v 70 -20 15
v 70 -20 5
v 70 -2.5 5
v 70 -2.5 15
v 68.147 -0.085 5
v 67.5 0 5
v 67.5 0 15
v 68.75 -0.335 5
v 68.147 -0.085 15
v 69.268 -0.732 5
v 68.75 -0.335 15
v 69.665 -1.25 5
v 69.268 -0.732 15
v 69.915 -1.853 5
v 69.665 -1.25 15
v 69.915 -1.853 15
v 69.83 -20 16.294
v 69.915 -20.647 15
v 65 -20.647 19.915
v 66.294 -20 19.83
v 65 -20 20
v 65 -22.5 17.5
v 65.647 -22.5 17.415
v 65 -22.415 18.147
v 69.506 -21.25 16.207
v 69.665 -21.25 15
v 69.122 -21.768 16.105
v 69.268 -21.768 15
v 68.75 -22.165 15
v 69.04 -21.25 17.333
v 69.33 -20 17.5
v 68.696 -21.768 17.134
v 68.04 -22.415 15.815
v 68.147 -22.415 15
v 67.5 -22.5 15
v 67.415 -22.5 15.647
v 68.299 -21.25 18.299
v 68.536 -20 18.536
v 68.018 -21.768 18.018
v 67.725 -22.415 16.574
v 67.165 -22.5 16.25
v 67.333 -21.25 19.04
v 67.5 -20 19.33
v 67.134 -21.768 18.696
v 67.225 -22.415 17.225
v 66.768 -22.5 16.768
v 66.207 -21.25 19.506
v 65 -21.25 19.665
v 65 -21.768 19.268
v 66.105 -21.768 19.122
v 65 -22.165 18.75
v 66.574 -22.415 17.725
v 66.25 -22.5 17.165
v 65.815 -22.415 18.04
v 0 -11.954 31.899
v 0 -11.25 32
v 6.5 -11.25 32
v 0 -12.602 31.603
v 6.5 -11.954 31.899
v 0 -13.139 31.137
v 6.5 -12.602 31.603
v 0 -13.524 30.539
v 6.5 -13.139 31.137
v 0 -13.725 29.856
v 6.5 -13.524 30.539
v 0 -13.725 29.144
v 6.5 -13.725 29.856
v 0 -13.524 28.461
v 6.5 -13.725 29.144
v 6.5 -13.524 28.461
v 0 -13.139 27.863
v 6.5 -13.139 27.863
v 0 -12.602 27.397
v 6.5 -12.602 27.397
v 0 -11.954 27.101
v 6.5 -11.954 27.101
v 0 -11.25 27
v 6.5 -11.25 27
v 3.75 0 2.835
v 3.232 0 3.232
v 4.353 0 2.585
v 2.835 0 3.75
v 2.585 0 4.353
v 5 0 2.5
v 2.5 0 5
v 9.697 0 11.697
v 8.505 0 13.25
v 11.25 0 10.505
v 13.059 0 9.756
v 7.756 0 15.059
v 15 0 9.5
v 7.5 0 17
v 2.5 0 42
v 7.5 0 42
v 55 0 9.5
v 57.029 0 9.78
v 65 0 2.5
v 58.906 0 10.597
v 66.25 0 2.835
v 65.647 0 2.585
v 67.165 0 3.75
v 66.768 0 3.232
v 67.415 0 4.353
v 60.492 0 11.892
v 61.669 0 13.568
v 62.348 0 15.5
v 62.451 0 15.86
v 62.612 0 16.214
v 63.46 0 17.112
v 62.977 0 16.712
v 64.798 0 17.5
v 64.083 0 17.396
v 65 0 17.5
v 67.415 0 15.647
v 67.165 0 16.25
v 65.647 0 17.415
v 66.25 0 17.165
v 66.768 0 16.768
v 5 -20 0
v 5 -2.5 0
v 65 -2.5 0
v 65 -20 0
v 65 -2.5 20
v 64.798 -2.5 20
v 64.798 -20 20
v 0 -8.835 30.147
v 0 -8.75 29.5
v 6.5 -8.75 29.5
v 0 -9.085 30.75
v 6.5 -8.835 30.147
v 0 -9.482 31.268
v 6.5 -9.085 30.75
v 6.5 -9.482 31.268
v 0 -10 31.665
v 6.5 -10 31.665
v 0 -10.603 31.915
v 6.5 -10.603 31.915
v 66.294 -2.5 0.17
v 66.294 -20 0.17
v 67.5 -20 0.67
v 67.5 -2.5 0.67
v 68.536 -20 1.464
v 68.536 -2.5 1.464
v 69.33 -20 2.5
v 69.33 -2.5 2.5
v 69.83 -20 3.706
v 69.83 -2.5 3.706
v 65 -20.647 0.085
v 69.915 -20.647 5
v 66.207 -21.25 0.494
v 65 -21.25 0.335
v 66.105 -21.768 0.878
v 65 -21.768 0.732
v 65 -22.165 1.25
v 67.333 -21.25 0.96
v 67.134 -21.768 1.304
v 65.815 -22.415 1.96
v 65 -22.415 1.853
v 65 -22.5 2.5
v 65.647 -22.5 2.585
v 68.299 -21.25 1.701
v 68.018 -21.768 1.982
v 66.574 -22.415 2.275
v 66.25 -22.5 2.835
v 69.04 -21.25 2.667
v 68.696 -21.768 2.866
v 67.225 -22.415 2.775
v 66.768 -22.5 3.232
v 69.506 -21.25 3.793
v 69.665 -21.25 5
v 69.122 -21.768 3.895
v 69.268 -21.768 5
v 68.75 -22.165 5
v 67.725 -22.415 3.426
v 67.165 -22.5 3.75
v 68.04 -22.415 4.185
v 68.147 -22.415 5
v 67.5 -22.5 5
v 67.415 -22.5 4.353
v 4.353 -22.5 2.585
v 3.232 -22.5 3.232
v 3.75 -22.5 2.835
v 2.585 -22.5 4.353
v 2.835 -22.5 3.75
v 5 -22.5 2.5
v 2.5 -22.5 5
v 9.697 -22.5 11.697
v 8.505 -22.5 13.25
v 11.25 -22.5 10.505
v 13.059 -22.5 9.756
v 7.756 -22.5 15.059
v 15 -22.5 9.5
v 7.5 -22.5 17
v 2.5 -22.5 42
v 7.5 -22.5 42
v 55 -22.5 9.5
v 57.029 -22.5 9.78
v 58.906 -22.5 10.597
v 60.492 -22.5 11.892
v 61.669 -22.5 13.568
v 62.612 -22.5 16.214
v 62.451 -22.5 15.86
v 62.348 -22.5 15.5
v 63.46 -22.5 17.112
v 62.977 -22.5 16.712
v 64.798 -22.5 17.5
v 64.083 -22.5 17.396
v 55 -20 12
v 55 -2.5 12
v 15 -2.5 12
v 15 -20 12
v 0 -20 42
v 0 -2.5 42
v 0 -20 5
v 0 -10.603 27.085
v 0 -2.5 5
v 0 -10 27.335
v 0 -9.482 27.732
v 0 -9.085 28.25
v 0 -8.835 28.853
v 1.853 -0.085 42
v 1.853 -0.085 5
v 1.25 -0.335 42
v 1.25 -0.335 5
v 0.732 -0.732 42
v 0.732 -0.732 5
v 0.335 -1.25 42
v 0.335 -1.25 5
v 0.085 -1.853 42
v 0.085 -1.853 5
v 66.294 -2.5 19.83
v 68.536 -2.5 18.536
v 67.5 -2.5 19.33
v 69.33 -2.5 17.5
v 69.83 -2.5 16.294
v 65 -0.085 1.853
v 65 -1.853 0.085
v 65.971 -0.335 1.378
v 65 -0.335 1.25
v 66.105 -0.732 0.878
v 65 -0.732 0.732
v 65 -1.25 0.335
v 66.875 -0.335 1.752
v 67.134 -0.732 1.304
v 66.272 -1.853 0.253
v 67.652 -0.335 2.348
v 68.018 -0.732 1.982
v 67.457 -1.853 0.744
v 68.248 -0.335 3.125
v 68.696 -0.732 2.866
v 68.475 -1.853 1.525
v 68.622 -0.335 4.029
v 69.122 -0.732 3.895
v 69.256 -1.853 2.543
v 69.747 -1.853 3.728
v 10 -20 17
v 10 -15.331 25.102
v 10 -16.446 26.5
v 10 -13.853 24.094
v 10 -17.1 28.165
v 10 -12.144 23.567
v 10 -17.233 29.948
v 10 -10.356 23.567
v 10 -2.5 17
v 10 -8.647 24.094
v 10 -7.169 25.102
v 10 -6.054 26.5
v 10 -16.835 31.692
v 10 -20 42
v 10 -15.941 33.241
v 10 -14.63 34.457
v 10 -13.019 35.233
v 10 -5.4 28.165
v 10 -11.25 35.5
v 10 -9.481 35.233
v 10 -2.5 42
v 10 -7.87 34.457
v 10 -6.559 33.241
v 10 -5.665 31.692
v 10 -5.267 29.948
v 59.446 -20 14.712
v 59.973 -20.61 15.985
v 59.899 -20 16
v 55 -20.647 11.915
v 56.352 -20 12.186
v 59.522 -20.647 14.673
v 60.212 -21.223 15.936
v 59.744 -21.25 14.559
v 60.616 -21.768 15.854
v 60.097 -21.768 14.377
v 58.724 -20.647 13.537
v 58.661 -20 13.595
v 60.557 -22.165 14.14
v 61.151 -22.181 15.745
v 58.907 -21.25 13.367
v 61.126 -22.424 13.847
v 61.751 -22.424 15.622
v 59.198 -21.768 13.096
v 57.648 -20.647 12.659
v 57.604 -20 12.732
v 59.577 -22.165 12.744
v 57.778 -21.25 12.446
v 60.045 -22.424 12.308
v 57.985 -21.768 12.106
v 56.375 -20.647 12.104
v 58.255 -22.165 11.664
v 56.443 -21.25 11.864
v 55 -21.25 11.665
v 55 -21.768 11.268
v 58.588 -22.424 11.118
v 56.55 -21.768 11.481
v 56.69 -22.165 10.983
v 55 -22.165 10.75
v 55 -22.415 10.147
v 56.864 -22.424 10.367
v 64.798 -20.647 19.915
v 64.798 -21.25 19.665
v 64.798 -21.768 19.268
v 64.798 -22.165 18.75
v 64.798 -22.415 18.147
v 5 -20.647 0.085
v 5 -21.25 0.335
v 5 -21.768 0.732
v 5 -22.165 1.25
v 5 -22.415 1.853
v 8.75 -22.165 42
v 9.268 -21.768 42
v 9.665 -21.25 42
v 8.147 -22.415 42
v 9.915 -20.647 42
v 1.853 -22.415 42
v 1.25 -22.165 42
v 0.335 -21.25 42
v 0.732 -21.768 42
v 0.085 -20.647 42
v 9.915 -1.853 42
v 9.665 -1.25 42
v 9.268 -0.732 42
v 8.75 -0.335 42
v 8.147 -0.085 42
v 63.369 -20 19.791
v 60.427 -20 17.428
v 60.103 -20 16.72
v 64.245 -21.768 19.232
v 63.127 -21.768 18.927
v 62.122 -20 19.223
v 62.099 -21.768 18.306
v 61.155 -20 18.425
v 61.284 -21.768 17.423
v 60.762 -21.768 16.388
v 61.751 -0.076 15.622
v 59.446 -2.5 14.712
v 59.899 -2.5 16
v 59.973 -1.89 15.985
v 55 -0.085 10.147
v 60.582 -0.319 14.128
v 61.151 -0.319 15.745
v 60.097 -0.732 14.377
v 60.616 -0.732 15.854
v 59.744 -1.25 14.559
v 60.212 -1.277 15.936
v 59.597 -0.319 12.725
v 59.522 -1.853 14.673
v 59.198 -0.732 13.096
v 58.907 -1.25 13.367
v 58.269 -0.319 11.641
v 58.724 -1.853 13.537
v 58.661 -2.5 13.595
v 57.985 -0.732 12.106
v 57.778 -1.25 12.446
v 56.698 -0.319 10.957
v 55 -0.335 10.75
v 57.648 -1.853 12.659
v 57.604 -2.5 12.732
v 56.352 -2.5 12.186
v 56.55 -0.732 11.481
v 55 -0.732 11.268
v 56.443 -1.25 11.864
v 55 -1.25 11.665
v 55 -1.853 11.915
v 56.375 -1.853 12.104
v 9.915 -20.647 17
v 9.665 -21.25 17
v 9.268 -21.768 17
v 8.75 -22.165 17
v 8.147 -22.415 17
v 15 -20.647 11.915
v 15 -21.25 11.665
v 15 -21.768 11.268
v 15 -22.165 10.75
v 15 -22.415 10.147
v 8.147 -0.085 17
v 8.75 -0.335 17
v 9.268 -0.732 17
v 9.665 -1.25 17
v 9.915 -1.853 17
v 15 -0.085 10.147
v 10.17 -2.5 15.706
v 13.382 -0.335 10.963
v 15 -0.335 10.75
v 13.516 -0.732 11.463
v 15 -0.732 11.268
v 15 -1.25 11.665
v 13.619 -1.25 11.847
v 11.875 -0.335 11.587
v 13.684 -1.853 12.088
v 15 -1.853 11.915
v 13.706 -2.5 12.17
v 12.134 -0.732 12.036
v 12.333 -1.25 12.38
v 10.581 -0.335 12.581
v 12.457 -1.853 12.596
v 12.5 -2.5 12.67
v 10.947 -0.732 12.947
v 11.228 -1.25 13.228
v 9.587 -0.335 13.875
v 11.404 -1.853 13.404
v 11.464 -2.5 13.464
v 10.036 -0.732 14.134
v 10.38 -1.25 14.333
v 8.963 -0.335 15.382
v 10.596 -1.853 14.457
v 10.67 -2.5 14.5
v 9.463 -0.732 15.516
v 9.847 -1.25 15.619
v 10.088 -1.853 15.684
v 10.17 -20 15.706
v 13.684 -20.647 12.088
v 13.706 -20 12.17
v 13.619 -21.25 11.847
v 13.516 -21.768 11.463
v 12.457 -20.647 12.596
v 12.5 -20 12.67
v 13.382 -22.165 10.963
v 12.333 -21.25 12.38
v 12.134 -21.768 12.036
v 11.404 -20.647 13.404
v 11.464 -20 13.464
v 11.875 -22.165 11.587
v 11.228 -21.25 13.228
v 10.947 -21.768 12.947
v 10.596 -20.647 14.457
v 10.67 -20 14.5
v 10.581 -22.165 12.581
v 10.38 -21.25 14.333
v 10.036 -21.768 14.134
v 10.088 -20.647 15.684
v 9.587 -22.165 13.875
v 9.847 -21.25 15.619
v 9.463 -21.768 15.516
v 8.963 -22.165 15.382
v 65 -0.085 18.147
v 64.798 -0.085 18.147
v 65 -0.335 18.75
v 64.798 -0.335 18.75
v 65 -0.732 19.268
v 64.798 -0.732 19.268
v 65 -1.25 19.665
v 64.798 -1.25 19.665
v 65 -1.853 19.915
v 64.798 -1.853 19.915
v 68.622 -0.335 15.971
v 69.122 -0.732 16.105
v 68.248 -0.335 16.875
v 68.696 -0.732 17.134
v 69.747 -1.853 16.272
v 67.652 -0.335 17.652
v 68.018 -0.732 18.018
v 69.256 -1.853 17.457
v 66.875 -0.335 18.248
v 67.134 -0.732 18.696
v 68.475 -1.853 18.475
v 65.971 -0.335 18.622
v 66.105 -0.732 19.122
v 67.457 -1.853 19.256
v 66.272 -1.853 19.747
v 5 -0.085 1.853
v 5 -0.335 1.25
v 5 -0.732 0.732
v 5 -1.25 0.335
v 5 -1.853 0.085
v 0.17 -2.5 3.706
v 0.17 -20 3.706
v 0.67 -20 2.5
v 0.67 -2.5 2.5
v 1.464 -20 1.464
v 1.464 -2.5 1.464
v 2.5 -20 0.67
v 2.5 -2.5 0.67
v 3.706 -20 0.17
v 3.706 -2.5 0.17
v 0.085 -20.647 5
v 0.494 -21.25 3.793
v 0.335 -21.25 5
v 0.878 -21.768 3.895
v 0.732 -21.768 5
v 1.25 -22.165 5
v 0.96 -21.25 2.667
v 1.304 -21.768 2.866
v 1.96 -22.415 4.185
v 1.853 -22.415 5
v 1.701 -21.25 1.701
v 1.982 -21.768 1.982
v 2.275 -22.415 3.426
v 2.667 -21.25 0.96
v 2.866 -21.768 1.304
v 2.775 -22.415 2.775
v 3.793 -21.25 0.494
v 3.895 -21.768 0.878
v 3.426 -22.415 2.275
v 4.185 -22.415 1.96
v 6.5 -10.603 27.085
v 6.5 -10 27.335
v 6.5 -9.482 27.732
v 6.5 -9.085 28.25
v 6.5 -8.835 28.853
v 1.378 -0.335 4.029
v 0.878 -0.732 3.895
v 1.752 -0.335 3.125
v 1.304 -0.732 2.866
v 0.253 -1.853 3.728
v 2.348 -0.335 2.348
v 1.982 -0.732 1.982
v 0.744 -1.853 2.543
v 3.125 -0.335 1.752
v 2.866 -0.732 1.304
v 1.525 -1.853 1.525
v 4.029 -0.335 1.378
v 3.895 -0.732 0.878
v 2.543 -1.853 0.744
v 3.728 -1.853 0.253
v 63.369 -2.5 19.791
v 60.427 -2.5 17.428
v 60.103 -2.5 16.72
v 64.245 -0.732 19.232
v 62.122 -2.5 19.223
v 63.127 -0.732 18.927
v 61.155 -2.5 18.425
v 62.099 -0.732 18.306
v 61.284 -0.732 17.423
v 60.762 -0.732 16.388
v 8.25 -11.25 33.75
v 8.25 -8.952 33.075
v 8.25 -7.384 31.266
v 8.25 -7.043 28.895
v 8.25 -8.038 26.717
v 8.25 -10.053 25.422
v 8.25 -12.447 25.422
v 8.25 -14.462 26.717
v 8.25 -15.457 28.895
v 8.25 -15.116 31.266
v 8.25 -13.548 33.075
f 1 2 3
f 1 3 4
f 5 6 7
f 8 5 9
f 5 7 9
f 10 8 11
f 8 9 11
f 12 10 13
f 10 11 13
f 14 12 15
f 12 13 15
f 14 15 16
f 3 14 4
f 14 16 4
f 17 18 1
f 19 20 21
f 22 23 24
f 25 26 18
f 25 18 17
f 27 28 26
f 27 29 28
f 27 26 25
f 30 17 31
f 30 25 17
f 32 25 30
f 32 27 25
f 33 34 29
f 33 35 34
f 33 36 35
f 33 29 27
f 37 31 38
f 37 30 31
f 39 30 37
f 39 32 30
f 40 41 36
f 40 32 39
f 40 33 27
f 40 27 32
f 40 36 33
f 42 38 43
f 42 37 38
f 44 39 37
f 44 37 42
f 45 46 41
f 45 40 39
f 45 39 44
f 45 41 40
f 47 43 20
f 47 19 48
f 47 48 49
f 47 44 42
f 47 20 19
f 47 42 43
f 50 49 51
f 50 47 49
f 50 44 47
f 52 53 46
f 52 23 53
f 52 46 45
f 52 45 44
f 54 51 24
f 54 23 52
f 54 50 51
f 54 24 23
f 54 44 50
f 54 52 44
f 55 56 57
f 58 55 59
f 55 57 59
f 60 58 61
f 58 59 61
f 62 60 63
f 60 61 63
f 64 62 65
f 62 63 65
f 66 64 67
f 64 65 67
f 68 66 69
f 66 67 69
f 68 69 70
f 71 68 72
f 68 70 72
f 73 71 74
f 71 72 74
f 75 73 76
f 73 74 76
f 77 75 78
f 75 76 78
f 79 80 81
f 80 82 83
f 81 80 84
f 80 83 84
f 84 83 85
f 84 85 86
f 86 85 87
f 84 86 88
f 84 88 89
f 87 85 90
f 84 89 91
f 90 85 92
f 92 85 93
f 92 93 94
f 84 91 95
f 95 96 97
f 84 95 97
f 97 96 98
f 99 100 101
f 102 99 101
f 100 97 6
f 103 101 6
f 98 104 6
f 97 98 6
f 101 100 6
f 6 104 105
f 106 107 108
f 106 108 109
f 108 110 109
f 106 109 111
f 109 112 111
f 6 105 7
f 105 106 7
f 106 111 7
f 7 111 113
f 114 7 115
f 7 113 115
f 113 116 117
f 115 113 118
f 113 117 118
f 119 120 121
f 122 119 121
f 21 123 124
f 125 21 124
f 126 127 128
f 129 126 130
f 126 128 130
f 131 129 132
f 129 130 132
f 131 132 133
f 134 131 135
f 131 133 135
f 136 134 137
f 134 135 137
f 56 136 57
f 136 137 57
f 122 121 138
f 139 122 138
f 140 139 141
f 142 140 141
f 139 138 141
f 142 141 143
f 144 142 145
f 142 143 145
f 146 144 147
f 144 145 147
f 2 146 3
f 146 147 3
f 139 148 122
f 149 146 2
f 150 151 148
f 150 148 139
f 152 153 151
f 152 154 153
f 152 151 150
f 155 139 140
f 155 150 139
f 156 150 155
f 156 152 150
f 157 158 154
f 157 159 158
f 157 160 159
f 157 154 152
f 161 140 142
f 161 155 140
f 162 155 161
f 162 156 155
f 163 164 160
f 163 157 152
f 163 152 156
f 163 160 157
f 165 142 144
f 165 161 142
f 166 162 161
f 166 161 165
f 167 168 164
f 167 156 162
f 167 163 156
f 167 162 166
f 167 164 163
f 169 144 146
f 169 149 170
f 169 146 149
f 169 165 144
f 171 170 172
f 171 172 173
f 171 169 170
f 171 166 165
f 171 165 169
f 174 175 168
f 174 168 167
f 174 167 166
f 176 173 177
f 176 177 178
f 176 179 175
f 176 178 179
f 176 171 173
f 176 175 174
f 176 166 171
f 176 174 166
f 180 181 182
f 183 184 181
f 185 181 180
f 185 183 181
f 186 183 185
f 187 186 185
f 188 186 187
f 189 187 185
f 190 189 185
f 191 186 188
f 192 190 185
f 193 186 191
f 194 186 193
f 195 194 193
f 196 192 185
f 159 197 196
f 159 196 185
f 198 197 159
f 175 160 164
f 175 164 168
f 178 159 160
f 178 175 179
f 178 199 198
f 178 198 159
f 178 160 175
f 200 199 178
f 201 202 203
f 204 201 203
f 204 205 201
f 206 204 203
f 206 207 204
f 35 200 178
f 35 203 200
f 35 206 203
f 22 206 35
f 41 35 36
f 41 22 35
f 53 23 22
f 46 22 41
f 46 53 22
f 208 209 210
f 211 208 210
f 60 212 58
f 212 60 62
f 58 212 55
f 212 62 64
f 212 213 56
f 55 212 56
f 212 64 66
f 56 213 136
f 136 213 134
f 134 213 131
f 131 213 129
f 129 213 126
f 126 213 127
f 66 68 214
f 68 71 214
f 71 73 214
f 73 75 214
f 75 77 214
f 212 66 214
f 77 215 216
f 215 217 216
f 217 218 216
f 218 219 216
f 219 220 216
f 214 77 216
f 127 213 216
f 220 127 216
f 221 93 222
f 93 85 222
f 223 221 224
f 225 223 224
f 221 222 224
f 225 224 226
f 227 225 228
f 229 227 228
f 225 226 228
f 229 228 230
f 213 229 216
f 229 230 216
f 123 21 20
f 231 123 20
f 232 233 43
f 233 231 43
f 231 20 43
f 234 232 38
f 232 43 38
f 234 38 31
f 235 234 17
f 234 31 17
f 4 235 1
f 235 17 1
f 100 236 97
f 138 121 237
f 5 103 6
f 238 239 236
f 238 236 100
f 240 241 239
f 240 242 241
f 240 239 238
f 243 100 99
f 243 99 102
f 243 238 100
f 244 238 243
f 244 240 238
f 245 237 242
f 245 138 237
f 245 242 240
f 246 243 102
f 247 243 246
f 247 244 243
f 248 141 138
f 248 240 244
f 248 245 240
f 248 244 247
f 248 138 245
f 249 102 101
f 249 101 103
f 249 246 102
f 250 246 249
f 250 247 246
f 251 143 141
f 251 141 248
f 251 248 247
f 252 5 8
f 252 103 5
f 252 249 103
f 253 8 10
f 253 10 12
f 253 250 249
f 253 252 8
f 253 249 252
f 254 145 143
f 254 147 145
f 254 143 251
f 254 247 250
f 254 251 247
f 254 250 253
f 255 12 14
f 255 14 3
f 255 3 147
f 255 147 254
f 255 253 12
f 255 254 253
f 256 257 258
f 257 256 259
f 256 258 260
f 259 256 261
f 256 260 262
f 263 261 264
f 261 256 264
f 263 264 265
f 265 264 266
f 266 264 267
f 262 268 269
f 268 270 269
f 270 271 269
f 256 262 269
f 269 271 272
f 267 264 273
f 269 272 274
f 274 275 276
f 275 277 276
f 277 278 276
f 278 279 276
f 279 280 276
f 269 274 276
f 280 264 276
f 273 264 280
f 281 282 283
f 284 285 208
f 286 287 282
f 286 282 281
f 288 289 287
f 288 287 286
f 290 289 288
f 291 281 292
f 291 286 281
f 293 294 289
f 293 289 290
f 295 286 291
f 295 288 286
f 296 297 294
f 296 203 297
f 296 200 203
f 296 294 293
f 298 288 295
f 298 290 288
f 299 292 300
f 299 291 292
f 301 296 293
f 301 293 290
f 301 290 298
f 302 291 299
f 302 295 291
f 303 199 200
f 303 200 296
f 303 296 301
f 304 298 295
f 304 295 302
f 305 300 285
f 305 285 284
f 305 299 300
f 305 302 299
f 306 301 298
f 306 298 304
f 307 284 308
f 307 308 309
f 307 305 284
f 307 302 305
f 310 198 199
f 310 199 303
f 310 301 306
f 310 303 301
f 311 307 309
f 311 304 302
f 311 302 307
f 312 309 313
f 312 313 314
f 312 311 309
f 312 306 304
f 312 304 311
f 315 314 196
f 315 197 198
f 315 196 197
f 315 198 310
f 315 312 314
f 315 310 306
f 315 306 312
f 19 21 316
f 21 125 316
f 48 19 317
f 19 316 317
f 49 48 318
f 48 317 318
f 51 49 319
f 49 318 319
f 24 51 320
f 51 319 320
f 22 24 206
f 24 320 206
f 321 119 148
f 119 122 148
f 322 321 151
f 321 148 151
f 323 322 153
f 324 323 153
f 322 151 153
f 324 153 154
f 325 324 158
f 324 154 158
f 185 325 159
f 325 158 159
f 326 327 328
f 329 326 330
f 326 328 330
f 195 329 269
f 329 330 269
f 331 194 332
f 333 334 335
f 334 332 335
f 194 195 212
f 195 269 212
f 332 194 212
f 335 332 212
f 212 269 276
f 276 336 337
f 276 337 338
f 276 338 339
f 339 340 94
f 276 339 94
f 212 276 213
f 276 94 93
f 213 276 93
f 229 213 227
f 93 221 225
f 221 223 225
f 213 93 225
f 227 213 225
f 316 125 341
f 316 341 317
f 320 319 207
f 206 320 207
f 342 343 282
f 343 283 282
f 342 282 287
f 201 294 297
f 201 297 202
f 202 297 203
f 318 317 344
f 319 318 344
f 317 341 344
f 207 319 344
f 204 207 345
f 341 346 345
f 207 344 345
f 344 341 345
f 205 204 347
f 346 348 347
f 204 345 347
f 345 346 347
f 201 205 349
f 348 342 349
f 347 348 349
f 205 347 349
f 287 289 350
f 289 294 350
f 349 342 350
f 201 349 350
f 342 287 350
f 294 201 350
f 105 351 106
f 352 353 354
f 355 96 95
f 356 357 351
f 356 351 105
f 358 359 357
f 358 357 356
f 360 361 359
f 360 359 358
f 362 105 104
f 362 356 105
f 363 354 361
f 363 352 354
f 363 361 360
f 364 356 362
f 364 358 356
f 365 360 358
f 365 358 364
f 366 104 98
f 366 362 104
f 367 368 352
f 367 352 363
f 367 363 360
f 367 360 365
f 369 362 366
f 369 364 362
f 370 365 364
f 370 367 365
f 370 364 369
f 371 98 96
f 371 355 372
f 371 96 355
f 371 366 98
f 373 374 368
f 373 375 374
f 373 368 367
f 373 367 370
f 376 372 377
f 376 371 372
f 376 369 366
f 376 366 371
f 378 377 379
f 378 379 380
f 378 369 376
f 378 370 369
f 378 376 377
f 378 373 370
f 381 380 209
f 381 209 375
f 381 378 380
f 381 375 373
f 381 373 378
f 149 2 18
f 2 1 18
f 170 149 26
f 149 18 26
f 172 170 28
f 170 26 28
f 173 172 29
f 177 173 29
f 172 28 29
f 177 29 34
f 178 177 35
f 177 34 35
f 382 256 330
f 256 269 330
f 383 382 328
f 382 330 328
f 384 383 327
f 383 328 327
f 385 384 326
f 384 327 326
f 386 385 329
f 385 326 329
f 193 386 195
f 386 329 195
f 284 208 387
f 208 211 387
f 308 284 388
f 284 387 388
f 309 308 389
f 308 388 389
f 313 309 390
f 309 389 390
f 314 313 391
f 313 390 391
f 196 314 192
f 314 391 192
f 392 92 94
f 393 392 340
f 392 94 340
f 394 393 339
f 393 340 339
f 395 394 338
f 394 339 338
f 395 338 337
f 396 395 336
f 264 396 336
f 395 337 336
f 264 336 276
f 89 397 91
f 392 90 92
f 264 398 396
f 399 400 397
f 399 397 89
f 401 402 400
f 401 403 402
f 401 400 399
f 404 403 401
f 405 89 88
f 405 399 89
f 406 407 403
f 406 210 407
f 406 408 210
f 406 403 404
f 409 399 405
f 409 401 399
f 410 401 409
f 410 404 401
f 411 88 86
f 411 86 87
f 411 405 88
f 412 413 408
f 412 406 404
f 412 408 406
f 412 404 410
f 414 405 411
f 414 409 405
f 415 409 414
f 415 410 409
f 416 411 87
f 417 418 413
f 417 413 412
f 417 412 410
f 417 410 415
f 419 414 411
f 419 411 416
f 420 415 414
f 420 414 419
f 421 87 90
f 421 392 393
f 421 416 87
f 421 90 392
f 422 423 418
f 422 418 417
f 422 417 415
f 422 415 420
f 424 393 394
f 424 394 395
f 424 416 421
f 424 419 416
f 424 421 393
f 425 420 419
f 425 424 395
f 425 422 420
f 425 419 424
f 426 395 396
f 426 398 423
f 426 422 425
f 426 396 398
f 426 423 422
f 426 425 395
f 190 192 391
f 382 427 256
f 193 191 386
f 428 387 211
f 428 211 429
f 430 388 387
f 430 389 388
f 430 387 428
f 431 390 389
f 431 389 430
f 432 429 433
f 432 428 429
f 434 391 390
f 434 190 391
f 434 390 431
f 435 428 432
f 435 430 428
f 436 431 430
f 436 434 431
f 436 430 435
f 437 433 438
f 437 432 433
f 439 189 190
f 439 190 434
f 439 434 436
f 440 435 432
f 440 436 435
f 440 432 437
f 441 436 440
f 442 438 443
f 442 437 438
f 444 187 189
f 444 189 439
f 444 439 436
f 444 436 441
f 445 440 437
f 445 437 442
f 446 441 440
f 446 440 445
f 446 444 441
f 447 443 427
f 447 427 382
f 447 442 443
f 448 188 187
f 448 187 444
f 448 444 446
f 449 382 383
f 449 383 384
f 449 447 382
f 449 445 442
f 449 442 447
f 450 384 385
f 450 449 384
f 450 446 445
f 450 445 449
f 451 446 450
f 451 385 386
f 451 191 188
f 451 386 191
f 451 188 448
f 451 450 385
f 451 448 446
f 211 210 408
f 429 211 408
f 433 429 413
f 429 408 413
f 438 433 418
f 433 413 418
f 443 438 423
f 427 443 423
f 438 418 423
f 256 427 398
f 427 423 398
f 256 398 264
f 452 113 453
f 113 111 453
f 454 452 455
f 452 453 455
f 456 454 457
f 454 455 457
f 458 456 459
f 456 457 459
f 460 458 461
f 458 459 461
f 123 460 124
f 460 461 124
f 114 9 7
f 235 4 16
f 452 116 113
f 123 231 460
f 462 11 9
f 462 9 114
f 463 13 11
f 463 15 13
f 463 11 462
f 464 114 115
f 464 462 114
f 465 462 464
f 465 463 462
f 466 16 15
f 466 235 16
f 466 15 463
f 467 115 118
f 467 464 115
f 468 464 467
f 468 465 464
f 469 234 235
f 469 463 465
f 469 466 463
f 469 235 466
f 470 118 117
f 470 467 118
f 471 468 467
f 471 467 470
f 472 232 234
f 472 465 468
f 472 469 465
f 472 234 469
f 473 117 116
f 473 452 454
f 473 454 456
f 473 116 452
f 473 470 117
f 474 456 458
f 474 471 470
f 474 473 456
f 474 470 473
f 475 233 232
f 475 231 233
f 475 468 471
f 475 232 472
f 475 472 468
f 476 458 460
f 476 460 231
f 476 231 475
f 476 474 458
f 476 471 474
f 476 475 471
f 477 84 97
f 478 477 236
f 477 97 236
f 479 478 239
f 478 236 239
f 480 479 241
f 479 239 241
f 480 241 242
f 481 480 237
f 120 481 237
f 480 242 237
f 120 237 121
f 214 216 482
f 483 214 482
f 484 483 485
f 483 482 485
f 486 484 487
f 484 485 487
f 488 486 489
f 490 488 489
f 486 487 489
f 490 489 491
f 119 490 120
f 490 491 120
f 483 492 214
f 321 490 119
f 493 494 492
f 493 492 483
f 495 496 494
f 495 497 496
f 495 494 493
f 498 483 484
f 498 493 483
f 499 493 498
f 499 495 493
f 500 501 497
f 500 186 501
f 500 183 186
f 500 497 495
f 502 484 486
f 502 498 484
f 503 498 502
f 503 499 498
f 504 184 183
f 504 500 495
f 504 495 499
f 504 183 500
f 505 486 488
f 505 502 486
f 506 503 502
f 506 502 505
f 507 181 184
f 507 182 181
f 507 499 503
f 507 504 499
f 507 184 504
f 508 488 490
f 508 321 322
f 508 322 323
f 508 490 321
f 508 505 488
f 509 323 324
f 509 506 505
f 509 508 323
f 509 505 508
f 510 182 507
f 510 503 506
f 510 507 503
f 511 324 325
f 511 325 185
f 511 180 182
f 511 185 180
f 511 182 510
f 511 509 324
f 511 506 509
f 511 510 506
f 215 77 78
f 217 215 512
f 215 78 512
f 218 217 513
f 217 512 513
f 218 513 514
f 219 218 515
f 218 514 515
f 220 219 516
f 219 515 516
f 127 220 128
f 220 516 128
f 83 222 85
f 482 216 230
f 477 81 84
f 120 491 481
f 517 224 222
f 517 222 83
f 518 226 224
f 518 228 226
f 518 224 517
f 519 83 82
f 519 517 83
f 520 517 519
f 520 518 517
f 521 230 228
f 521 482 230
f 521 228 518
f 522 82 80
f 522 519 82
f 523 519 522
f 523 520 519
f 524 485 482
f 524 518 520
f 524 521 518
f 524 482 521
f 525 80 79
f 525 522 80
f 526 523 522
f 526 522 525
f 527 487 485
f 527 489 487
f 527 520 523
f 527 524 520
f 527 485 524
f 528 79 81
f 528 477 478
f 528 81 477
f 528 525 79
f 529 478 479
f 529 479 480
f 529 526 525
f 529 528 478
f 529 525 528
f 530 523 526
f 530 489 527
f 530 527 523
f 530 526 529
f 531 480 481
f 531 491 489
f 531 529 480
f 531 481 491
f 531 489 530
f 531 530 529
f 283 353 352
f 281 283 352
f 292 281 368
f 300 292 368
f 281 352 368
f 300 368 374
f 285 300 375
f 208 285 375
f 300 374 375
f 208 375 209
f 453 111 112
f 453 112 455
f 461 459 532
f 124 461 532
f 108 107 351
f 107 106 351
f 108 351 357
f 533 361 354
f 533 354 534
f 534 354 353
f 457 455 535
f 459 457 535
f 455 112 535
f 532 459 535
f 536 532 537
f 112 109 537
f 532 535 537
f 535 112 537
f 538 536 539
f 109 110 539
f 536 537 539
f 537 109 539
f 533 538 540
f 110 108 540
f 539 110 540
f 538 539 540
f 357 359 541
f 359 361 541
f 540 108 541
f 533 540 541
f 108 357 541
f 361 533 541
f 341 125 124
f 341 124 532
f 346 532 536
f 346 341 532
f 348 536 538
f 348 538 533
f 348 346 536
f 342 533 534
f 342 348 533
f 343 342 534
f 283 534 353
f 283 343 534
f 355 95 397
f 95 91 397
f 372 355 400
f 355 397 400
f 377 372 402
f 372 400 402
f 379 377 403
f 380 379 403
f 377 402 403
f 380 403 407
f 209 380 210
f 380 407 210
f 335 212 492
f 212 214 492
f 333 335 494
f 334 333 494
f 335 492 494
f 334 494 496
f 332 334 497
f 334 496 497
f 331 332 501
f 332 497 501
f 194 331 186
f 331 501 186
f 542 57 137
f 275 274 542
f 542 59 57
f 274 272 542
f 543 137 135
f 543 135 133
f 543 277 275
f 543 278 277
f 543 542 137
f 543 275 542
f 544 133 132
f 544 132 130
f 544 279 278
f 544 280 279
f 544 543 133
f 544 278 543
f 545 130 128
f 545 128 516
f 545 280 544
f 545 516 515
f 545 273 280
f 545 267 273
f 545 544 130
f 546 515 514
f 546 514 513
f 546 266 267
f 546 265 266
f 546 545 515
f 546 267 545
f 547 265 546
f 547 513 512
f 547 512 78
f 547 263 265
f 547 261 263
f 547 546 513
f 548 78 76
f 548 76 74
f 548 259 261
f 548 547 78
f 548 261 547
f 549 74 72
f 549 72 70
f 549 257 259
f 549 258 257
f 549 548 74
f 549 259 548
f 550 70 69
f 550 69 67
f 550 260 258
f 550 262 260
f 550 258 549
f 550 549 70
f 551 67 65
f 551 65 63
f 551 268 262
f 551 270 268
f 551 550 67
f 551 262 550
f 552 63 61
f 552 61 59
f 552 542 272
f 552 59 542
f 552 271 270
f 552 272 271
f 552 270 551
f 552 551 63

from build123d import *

# Parameters (mm, degrees)
F1_DEPTH = 22.5
F3_DEPTH = 25
F7_R     = 5
F8_R     = 5
F9_R     = 2.5


with BuildPart() as f1:
    # F0 (on Front) → F1 (new body)
    with BuildSketch(Plane.XZ):
        with BuildLine():
            Line((0, 42), (0, 5))
            ThreePointArc((0, 5), (1.4644660941, 1.4644660941), (5, 0))
            Line((5, 0), (65, 0))
            ThreePointArc((65, 0), (68.5355339059, 1.4644660941), (70, 5))
            Line((70, 5), (70, 20))
            Line((70, 20), (60, 20))
            Line((60, 20), (60, 17))
            ThreePointArc((60, 17), (58.5355339059, 13.4644660941), (55, 12))
            Line((55, 12), (15, 12))
            ThreePointArc((15, 12), (11.4644660941, 13.4644660941), (10, 17))
            Line((10, 17), (10, 42))
            Line((10, 42), (0, 42))
        make_face()
    extrude(amount=F1_DEPTH)

    # F2 (on face) → F3 (cut)
    with BuildSketch(Plane.YZ.offset(10)):
        with BuildLine():
            ThreePointArc((-8.75, 29.5), (-9.482233047, 31.267766953), (-11.25, 32))
            Line((-11.25, 32), (-11.25, 27))
            ThreePointArc((-11.25, 27), (-9.482233047, 27.732233047), (-8.75, 29.5))
        make_face()
        with BuildLine():
            Line((-11.25, 27), (-11.25, 32))
            ThreePointArc((-11.25, 32), (-13.75, 29.5), (-11.25, 27))
        make_face()
    extrude(amount=-F3_DEPTH, mode=Mode.SUBTRACT)

    # F5 (on line) → F6 (revolve, cut)
    with BuildSketch(Plane(origin=(0, -11.25, 0), x_dir=(-1, 0, 0), z_dir=(0, 1, 0))):
        Polygon((-6.5, 32), (-10, 35.5), (-10, 32), align=None)
    revolve(axis=Axis((5, -11.25, 29.5), (-1, 0, 0)), mode=Mode.SUBTRACT)

    # F7
    f7_edges = [f1.edges().sort_by_distance(p)[0] for p in [
        (60, -11.25, 20),
    ]]
    fillet(f7_edges, radius=F7_R)

    # F8
    f8_edges = [f1.edges().sort_by_distance(p)[0] for p in [
        (70, -11.25, 20),
    ]]
    fillet(f8_edges, radius=F8_R)

    # F9
    f9_edges = [f1.edges().sort_by_distance(p)[0] for p in [
        (35, 0, 12),
        (35, -22.5, 12),
    ]]
    fillet(f9_edges, radius=F9_R)


solid = f1.part
